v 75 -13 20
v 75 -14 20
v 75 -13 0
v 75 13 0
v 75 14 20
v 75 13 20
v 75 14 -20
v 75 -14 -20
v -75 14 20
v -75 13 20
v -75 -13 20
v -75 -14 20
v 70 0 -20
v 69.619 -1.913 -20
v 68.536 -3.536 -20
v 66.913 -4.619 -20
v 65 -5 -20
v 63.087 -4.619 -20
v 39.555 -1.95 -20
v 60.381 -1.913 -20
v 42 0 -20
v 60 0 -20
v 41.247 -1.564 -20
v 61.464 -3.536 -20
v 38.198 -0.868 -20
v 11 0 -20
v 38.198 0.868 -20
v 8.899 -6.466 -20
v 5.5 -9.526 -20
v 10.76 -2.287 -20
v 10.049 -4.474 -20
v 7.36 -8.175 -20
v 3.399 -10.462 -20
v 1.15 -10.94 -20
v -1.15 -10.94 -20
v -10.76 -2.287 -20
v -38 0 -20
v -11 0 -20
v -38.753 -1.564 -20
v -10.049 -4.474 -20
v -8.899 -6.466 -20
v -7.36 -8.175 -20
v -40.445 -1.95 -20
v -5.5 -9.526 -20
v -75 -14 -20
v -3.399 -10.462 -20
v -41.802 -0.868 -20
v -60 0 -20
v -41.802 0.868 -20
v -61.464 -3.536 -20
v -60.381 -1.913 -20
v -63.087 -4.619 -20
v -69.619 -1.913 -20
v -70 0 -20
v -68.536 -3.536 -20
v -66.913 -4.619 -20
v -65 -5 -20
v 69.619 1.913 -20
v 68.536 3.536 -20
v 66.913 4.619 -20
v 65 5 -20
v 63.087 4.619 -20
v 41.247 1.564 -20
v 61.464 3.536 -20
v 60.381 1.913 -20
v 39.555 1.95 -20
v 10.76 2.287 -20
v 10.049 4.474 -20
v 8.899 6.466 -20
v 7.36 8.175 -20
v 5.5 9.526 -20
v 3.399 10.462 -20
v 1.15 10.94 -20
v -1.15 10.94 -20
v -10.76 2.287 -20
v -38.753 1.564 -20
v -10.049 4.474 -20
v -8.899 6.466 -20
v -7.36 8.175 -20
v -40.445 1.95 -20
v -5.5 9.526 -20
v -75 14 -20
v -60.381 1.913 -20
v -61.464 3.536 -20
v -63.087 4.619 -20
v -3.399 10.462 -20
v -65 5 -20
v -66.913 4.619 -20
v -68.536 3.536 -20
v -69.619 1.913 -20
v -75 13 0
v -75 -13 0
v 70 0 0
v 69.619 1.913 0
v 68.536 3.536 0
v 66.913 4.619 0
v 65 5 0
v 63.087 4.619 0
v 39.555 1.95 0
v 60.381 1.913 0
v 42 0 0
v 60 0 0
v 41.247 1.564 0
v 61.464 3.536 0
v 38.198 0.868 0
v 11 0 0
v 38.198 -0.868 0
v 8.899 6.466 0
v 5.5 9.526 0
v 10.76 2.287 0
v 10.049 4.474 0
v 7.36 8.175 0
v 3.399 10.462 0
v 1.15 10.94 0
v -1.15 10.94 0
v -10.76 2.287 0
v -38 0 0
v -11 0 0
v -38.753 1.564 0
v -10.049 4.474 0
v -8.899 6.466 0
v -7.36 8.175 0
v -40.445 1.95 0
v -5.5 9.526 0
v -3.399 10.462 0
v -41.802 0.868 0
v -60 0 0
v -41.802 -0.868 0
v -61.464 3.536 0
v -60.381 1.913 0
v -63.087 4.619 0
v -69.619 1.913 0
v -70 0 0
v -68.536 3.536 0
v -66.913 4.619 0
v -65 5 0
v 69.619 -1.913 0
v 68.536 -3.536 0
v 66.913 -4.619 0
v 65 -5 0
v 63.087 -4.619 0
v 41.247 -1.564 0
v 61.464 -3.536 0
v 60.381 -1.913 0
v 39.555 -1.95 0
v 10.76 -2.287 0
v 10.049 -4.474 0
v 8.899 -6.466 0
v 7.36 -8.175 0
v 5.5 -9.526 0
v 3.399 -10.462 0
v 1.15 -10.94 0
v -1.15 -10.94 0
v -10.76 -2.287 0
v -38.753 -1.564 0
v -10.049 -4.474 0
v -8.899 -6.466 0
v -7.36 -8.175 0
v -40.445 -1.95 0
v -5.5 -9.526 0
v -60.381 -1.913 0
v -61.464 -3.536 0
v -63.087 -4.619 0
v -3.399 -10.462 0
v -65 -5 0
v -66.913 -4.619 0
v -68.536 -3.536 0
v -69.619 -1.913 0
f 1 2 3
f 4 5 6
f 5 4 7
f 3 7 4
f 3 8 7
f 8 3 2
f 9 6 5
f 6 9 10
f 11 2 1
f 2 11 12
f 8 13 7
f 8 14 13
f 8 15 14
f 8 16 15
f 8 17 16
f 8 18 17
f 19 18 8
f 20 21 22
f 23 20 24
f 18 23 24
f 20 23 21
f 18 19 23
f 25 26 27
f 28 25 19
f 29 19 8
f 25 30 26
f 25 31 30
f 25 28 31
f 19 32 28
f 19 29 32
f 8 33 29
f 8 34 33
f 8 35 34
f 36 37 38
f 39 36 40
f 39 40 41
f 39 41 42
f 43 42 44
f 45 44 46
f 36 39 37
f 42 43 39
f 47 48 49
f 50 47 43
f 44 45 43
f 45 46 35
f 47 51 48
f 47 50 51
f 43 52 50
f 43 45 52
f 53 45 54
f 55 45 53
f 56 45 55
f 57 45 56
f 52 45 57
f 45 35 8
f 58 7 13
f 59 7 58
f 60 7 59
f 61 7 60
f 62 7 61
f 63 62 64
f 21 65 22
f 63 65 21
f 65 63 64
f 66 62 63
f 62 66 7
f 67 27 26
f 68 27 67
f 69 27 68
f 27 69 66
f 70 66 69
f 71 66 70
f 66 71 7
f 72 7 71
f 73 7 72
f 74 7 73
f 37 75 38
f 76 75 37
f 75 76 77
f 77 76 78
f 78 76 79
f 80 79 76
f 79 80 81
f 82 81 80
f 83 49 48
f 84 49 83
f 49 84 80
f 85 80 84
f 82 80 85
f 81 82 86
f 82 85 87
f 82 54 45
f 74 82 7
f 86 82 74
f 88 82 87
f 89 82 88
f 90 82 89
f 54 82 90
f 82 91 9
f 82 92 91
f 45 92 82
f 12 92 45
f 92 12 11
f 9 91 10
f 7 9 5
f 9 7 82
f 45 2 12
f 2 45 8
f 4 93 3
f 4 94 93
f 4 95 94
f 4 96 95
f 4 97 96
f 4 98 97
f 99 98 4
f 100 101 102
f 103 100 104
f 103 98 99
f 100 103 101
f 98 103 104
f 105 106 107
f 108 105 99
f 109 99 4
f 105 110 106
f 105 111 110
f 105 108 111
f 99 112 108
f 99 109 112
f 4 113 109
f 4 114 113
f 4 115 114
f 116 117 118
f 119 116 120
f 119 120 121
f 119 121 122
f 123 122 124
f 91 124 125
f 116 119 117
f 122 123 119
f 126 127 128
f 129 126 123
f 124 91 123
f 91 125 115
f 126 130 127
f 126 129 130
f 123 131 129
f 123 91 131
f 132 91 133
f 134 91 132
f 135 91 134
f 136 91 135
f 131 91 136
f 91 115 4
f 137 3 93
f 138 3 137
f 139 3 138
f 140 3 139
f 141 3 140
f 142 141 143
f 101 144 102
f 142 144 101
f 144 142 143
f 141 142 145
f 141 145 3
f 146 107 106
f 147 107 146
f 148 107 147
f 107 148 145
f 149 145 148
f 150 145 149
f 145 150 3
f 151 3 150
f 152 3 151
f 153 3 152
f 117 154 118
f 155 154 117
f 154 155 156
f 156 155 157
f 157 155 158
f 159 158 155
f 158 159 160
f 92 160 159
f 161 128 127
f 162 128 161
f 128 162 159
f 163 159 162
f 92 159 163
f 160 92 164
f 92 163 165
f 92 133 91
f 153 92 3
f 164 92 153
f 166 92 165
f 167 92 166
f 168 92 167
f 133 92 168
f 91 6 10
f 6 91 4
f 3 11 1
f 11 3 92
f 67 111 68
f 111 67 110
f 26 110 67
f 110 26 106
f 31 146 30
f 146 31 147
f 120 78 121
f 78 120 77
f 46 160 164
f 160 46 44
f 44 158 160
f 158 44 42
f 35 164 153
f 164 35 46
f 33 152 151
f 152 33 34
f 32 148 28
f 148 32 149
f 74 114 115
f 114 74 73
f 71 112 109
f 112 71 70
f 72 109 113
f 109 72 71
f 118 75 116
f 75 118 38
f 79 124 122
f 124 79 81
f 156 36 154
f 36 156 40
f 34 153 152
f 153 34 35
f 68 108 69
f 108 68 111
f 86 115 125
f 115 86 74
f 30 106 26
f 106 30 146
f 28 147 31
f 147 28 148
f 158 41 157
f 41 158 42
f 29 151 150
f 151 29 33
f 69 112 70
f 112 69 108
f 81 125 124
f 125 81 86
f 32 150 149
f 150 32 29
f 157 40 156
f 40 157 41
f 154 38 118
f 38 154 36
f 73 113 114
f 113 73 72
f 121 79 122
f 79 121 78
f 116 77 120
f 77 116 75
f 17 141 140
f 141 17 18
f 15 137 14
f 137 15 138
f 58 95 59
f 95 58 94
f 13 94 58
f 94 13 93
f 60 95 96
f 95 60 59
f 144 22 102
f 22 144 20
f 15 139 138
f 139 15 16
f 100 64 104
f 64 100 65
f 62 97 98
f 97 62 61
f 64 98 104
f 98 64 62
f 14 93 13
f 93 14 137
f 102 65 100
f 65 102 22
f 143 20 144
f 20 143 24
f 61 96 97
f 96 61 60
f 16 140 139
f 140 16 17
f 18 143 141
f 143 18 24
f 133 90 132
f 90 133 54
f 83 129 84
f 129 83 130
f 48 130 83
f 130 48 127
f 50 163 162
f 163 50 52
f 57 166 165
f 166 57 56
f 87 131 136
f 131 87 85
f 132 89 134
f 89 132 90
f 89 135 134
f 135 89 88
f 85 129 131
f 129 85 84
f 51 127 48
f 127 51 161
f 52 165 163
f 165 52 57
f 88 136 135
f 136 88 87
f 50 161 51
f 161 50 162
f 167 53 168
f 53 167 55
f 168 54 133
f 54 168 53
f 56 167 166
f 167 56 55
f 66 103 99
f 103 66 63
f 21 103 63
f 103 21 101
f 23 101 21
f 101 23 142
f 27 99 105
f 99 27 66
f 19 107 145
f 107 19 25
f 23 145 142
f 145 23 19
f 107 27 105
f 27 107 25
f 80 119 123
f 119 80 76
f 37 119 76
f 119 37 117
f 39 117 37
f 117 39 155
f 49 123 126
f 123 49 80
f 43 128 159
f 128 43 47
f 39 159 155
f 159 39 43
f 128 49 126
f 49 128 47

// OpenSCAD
// file: veriables.scad
aluminum_width			= 20;
wall_thickness			= 3;
depth						= 20;
smooth_rod				= 10;
long_bearing_od			= 19;
long_bearing_length		= 29;
bearing_outer			= 22;
bearing_inner			= 8;
bearing_thick				= 7;
screw_diamiter			= 4;
motor_width				= 42.5;
motor_screw_space		= 31;

hotend_gap				= 6;
hotend_gap_dia			= 12;
hotend_top				= 3;
hotend_top_dia			= 16;

x_rod_spacing			= 60;

aluminum_plate_thick	= 3;
// main file
include <veriables.scad>;

difference(){
	cube([150,bearing_outer+(wall_thickness*2),aluminum_width*2],center=true);
	translate([0,0,aluminum_width]) cube([150,aluminum_width+(wall_thickness*2),aluminum_width*2],center=true);
	translate([0,0,-aluminum_width/2]) cylinder(d=bearing_outer,h=aluminum_width+2,center=true);
	translate([150/2-smooth_rod,0,0]) cylinder(d=smooth_rod,h=100,center=true);
	translate([-150/2+smooth_rod,0,0]) cylinder(d=smooth_rod,h=100,center=true);
	//T-slot screw holes
	translate([150/3-smooth_rod,0,0]) cylinder(d=screw_diamiter,h=100,center=true);
	translate([-150/3+smooth_rod,0,0]) cylinder(d=screw_diamiter,h=100,center=true);
}
